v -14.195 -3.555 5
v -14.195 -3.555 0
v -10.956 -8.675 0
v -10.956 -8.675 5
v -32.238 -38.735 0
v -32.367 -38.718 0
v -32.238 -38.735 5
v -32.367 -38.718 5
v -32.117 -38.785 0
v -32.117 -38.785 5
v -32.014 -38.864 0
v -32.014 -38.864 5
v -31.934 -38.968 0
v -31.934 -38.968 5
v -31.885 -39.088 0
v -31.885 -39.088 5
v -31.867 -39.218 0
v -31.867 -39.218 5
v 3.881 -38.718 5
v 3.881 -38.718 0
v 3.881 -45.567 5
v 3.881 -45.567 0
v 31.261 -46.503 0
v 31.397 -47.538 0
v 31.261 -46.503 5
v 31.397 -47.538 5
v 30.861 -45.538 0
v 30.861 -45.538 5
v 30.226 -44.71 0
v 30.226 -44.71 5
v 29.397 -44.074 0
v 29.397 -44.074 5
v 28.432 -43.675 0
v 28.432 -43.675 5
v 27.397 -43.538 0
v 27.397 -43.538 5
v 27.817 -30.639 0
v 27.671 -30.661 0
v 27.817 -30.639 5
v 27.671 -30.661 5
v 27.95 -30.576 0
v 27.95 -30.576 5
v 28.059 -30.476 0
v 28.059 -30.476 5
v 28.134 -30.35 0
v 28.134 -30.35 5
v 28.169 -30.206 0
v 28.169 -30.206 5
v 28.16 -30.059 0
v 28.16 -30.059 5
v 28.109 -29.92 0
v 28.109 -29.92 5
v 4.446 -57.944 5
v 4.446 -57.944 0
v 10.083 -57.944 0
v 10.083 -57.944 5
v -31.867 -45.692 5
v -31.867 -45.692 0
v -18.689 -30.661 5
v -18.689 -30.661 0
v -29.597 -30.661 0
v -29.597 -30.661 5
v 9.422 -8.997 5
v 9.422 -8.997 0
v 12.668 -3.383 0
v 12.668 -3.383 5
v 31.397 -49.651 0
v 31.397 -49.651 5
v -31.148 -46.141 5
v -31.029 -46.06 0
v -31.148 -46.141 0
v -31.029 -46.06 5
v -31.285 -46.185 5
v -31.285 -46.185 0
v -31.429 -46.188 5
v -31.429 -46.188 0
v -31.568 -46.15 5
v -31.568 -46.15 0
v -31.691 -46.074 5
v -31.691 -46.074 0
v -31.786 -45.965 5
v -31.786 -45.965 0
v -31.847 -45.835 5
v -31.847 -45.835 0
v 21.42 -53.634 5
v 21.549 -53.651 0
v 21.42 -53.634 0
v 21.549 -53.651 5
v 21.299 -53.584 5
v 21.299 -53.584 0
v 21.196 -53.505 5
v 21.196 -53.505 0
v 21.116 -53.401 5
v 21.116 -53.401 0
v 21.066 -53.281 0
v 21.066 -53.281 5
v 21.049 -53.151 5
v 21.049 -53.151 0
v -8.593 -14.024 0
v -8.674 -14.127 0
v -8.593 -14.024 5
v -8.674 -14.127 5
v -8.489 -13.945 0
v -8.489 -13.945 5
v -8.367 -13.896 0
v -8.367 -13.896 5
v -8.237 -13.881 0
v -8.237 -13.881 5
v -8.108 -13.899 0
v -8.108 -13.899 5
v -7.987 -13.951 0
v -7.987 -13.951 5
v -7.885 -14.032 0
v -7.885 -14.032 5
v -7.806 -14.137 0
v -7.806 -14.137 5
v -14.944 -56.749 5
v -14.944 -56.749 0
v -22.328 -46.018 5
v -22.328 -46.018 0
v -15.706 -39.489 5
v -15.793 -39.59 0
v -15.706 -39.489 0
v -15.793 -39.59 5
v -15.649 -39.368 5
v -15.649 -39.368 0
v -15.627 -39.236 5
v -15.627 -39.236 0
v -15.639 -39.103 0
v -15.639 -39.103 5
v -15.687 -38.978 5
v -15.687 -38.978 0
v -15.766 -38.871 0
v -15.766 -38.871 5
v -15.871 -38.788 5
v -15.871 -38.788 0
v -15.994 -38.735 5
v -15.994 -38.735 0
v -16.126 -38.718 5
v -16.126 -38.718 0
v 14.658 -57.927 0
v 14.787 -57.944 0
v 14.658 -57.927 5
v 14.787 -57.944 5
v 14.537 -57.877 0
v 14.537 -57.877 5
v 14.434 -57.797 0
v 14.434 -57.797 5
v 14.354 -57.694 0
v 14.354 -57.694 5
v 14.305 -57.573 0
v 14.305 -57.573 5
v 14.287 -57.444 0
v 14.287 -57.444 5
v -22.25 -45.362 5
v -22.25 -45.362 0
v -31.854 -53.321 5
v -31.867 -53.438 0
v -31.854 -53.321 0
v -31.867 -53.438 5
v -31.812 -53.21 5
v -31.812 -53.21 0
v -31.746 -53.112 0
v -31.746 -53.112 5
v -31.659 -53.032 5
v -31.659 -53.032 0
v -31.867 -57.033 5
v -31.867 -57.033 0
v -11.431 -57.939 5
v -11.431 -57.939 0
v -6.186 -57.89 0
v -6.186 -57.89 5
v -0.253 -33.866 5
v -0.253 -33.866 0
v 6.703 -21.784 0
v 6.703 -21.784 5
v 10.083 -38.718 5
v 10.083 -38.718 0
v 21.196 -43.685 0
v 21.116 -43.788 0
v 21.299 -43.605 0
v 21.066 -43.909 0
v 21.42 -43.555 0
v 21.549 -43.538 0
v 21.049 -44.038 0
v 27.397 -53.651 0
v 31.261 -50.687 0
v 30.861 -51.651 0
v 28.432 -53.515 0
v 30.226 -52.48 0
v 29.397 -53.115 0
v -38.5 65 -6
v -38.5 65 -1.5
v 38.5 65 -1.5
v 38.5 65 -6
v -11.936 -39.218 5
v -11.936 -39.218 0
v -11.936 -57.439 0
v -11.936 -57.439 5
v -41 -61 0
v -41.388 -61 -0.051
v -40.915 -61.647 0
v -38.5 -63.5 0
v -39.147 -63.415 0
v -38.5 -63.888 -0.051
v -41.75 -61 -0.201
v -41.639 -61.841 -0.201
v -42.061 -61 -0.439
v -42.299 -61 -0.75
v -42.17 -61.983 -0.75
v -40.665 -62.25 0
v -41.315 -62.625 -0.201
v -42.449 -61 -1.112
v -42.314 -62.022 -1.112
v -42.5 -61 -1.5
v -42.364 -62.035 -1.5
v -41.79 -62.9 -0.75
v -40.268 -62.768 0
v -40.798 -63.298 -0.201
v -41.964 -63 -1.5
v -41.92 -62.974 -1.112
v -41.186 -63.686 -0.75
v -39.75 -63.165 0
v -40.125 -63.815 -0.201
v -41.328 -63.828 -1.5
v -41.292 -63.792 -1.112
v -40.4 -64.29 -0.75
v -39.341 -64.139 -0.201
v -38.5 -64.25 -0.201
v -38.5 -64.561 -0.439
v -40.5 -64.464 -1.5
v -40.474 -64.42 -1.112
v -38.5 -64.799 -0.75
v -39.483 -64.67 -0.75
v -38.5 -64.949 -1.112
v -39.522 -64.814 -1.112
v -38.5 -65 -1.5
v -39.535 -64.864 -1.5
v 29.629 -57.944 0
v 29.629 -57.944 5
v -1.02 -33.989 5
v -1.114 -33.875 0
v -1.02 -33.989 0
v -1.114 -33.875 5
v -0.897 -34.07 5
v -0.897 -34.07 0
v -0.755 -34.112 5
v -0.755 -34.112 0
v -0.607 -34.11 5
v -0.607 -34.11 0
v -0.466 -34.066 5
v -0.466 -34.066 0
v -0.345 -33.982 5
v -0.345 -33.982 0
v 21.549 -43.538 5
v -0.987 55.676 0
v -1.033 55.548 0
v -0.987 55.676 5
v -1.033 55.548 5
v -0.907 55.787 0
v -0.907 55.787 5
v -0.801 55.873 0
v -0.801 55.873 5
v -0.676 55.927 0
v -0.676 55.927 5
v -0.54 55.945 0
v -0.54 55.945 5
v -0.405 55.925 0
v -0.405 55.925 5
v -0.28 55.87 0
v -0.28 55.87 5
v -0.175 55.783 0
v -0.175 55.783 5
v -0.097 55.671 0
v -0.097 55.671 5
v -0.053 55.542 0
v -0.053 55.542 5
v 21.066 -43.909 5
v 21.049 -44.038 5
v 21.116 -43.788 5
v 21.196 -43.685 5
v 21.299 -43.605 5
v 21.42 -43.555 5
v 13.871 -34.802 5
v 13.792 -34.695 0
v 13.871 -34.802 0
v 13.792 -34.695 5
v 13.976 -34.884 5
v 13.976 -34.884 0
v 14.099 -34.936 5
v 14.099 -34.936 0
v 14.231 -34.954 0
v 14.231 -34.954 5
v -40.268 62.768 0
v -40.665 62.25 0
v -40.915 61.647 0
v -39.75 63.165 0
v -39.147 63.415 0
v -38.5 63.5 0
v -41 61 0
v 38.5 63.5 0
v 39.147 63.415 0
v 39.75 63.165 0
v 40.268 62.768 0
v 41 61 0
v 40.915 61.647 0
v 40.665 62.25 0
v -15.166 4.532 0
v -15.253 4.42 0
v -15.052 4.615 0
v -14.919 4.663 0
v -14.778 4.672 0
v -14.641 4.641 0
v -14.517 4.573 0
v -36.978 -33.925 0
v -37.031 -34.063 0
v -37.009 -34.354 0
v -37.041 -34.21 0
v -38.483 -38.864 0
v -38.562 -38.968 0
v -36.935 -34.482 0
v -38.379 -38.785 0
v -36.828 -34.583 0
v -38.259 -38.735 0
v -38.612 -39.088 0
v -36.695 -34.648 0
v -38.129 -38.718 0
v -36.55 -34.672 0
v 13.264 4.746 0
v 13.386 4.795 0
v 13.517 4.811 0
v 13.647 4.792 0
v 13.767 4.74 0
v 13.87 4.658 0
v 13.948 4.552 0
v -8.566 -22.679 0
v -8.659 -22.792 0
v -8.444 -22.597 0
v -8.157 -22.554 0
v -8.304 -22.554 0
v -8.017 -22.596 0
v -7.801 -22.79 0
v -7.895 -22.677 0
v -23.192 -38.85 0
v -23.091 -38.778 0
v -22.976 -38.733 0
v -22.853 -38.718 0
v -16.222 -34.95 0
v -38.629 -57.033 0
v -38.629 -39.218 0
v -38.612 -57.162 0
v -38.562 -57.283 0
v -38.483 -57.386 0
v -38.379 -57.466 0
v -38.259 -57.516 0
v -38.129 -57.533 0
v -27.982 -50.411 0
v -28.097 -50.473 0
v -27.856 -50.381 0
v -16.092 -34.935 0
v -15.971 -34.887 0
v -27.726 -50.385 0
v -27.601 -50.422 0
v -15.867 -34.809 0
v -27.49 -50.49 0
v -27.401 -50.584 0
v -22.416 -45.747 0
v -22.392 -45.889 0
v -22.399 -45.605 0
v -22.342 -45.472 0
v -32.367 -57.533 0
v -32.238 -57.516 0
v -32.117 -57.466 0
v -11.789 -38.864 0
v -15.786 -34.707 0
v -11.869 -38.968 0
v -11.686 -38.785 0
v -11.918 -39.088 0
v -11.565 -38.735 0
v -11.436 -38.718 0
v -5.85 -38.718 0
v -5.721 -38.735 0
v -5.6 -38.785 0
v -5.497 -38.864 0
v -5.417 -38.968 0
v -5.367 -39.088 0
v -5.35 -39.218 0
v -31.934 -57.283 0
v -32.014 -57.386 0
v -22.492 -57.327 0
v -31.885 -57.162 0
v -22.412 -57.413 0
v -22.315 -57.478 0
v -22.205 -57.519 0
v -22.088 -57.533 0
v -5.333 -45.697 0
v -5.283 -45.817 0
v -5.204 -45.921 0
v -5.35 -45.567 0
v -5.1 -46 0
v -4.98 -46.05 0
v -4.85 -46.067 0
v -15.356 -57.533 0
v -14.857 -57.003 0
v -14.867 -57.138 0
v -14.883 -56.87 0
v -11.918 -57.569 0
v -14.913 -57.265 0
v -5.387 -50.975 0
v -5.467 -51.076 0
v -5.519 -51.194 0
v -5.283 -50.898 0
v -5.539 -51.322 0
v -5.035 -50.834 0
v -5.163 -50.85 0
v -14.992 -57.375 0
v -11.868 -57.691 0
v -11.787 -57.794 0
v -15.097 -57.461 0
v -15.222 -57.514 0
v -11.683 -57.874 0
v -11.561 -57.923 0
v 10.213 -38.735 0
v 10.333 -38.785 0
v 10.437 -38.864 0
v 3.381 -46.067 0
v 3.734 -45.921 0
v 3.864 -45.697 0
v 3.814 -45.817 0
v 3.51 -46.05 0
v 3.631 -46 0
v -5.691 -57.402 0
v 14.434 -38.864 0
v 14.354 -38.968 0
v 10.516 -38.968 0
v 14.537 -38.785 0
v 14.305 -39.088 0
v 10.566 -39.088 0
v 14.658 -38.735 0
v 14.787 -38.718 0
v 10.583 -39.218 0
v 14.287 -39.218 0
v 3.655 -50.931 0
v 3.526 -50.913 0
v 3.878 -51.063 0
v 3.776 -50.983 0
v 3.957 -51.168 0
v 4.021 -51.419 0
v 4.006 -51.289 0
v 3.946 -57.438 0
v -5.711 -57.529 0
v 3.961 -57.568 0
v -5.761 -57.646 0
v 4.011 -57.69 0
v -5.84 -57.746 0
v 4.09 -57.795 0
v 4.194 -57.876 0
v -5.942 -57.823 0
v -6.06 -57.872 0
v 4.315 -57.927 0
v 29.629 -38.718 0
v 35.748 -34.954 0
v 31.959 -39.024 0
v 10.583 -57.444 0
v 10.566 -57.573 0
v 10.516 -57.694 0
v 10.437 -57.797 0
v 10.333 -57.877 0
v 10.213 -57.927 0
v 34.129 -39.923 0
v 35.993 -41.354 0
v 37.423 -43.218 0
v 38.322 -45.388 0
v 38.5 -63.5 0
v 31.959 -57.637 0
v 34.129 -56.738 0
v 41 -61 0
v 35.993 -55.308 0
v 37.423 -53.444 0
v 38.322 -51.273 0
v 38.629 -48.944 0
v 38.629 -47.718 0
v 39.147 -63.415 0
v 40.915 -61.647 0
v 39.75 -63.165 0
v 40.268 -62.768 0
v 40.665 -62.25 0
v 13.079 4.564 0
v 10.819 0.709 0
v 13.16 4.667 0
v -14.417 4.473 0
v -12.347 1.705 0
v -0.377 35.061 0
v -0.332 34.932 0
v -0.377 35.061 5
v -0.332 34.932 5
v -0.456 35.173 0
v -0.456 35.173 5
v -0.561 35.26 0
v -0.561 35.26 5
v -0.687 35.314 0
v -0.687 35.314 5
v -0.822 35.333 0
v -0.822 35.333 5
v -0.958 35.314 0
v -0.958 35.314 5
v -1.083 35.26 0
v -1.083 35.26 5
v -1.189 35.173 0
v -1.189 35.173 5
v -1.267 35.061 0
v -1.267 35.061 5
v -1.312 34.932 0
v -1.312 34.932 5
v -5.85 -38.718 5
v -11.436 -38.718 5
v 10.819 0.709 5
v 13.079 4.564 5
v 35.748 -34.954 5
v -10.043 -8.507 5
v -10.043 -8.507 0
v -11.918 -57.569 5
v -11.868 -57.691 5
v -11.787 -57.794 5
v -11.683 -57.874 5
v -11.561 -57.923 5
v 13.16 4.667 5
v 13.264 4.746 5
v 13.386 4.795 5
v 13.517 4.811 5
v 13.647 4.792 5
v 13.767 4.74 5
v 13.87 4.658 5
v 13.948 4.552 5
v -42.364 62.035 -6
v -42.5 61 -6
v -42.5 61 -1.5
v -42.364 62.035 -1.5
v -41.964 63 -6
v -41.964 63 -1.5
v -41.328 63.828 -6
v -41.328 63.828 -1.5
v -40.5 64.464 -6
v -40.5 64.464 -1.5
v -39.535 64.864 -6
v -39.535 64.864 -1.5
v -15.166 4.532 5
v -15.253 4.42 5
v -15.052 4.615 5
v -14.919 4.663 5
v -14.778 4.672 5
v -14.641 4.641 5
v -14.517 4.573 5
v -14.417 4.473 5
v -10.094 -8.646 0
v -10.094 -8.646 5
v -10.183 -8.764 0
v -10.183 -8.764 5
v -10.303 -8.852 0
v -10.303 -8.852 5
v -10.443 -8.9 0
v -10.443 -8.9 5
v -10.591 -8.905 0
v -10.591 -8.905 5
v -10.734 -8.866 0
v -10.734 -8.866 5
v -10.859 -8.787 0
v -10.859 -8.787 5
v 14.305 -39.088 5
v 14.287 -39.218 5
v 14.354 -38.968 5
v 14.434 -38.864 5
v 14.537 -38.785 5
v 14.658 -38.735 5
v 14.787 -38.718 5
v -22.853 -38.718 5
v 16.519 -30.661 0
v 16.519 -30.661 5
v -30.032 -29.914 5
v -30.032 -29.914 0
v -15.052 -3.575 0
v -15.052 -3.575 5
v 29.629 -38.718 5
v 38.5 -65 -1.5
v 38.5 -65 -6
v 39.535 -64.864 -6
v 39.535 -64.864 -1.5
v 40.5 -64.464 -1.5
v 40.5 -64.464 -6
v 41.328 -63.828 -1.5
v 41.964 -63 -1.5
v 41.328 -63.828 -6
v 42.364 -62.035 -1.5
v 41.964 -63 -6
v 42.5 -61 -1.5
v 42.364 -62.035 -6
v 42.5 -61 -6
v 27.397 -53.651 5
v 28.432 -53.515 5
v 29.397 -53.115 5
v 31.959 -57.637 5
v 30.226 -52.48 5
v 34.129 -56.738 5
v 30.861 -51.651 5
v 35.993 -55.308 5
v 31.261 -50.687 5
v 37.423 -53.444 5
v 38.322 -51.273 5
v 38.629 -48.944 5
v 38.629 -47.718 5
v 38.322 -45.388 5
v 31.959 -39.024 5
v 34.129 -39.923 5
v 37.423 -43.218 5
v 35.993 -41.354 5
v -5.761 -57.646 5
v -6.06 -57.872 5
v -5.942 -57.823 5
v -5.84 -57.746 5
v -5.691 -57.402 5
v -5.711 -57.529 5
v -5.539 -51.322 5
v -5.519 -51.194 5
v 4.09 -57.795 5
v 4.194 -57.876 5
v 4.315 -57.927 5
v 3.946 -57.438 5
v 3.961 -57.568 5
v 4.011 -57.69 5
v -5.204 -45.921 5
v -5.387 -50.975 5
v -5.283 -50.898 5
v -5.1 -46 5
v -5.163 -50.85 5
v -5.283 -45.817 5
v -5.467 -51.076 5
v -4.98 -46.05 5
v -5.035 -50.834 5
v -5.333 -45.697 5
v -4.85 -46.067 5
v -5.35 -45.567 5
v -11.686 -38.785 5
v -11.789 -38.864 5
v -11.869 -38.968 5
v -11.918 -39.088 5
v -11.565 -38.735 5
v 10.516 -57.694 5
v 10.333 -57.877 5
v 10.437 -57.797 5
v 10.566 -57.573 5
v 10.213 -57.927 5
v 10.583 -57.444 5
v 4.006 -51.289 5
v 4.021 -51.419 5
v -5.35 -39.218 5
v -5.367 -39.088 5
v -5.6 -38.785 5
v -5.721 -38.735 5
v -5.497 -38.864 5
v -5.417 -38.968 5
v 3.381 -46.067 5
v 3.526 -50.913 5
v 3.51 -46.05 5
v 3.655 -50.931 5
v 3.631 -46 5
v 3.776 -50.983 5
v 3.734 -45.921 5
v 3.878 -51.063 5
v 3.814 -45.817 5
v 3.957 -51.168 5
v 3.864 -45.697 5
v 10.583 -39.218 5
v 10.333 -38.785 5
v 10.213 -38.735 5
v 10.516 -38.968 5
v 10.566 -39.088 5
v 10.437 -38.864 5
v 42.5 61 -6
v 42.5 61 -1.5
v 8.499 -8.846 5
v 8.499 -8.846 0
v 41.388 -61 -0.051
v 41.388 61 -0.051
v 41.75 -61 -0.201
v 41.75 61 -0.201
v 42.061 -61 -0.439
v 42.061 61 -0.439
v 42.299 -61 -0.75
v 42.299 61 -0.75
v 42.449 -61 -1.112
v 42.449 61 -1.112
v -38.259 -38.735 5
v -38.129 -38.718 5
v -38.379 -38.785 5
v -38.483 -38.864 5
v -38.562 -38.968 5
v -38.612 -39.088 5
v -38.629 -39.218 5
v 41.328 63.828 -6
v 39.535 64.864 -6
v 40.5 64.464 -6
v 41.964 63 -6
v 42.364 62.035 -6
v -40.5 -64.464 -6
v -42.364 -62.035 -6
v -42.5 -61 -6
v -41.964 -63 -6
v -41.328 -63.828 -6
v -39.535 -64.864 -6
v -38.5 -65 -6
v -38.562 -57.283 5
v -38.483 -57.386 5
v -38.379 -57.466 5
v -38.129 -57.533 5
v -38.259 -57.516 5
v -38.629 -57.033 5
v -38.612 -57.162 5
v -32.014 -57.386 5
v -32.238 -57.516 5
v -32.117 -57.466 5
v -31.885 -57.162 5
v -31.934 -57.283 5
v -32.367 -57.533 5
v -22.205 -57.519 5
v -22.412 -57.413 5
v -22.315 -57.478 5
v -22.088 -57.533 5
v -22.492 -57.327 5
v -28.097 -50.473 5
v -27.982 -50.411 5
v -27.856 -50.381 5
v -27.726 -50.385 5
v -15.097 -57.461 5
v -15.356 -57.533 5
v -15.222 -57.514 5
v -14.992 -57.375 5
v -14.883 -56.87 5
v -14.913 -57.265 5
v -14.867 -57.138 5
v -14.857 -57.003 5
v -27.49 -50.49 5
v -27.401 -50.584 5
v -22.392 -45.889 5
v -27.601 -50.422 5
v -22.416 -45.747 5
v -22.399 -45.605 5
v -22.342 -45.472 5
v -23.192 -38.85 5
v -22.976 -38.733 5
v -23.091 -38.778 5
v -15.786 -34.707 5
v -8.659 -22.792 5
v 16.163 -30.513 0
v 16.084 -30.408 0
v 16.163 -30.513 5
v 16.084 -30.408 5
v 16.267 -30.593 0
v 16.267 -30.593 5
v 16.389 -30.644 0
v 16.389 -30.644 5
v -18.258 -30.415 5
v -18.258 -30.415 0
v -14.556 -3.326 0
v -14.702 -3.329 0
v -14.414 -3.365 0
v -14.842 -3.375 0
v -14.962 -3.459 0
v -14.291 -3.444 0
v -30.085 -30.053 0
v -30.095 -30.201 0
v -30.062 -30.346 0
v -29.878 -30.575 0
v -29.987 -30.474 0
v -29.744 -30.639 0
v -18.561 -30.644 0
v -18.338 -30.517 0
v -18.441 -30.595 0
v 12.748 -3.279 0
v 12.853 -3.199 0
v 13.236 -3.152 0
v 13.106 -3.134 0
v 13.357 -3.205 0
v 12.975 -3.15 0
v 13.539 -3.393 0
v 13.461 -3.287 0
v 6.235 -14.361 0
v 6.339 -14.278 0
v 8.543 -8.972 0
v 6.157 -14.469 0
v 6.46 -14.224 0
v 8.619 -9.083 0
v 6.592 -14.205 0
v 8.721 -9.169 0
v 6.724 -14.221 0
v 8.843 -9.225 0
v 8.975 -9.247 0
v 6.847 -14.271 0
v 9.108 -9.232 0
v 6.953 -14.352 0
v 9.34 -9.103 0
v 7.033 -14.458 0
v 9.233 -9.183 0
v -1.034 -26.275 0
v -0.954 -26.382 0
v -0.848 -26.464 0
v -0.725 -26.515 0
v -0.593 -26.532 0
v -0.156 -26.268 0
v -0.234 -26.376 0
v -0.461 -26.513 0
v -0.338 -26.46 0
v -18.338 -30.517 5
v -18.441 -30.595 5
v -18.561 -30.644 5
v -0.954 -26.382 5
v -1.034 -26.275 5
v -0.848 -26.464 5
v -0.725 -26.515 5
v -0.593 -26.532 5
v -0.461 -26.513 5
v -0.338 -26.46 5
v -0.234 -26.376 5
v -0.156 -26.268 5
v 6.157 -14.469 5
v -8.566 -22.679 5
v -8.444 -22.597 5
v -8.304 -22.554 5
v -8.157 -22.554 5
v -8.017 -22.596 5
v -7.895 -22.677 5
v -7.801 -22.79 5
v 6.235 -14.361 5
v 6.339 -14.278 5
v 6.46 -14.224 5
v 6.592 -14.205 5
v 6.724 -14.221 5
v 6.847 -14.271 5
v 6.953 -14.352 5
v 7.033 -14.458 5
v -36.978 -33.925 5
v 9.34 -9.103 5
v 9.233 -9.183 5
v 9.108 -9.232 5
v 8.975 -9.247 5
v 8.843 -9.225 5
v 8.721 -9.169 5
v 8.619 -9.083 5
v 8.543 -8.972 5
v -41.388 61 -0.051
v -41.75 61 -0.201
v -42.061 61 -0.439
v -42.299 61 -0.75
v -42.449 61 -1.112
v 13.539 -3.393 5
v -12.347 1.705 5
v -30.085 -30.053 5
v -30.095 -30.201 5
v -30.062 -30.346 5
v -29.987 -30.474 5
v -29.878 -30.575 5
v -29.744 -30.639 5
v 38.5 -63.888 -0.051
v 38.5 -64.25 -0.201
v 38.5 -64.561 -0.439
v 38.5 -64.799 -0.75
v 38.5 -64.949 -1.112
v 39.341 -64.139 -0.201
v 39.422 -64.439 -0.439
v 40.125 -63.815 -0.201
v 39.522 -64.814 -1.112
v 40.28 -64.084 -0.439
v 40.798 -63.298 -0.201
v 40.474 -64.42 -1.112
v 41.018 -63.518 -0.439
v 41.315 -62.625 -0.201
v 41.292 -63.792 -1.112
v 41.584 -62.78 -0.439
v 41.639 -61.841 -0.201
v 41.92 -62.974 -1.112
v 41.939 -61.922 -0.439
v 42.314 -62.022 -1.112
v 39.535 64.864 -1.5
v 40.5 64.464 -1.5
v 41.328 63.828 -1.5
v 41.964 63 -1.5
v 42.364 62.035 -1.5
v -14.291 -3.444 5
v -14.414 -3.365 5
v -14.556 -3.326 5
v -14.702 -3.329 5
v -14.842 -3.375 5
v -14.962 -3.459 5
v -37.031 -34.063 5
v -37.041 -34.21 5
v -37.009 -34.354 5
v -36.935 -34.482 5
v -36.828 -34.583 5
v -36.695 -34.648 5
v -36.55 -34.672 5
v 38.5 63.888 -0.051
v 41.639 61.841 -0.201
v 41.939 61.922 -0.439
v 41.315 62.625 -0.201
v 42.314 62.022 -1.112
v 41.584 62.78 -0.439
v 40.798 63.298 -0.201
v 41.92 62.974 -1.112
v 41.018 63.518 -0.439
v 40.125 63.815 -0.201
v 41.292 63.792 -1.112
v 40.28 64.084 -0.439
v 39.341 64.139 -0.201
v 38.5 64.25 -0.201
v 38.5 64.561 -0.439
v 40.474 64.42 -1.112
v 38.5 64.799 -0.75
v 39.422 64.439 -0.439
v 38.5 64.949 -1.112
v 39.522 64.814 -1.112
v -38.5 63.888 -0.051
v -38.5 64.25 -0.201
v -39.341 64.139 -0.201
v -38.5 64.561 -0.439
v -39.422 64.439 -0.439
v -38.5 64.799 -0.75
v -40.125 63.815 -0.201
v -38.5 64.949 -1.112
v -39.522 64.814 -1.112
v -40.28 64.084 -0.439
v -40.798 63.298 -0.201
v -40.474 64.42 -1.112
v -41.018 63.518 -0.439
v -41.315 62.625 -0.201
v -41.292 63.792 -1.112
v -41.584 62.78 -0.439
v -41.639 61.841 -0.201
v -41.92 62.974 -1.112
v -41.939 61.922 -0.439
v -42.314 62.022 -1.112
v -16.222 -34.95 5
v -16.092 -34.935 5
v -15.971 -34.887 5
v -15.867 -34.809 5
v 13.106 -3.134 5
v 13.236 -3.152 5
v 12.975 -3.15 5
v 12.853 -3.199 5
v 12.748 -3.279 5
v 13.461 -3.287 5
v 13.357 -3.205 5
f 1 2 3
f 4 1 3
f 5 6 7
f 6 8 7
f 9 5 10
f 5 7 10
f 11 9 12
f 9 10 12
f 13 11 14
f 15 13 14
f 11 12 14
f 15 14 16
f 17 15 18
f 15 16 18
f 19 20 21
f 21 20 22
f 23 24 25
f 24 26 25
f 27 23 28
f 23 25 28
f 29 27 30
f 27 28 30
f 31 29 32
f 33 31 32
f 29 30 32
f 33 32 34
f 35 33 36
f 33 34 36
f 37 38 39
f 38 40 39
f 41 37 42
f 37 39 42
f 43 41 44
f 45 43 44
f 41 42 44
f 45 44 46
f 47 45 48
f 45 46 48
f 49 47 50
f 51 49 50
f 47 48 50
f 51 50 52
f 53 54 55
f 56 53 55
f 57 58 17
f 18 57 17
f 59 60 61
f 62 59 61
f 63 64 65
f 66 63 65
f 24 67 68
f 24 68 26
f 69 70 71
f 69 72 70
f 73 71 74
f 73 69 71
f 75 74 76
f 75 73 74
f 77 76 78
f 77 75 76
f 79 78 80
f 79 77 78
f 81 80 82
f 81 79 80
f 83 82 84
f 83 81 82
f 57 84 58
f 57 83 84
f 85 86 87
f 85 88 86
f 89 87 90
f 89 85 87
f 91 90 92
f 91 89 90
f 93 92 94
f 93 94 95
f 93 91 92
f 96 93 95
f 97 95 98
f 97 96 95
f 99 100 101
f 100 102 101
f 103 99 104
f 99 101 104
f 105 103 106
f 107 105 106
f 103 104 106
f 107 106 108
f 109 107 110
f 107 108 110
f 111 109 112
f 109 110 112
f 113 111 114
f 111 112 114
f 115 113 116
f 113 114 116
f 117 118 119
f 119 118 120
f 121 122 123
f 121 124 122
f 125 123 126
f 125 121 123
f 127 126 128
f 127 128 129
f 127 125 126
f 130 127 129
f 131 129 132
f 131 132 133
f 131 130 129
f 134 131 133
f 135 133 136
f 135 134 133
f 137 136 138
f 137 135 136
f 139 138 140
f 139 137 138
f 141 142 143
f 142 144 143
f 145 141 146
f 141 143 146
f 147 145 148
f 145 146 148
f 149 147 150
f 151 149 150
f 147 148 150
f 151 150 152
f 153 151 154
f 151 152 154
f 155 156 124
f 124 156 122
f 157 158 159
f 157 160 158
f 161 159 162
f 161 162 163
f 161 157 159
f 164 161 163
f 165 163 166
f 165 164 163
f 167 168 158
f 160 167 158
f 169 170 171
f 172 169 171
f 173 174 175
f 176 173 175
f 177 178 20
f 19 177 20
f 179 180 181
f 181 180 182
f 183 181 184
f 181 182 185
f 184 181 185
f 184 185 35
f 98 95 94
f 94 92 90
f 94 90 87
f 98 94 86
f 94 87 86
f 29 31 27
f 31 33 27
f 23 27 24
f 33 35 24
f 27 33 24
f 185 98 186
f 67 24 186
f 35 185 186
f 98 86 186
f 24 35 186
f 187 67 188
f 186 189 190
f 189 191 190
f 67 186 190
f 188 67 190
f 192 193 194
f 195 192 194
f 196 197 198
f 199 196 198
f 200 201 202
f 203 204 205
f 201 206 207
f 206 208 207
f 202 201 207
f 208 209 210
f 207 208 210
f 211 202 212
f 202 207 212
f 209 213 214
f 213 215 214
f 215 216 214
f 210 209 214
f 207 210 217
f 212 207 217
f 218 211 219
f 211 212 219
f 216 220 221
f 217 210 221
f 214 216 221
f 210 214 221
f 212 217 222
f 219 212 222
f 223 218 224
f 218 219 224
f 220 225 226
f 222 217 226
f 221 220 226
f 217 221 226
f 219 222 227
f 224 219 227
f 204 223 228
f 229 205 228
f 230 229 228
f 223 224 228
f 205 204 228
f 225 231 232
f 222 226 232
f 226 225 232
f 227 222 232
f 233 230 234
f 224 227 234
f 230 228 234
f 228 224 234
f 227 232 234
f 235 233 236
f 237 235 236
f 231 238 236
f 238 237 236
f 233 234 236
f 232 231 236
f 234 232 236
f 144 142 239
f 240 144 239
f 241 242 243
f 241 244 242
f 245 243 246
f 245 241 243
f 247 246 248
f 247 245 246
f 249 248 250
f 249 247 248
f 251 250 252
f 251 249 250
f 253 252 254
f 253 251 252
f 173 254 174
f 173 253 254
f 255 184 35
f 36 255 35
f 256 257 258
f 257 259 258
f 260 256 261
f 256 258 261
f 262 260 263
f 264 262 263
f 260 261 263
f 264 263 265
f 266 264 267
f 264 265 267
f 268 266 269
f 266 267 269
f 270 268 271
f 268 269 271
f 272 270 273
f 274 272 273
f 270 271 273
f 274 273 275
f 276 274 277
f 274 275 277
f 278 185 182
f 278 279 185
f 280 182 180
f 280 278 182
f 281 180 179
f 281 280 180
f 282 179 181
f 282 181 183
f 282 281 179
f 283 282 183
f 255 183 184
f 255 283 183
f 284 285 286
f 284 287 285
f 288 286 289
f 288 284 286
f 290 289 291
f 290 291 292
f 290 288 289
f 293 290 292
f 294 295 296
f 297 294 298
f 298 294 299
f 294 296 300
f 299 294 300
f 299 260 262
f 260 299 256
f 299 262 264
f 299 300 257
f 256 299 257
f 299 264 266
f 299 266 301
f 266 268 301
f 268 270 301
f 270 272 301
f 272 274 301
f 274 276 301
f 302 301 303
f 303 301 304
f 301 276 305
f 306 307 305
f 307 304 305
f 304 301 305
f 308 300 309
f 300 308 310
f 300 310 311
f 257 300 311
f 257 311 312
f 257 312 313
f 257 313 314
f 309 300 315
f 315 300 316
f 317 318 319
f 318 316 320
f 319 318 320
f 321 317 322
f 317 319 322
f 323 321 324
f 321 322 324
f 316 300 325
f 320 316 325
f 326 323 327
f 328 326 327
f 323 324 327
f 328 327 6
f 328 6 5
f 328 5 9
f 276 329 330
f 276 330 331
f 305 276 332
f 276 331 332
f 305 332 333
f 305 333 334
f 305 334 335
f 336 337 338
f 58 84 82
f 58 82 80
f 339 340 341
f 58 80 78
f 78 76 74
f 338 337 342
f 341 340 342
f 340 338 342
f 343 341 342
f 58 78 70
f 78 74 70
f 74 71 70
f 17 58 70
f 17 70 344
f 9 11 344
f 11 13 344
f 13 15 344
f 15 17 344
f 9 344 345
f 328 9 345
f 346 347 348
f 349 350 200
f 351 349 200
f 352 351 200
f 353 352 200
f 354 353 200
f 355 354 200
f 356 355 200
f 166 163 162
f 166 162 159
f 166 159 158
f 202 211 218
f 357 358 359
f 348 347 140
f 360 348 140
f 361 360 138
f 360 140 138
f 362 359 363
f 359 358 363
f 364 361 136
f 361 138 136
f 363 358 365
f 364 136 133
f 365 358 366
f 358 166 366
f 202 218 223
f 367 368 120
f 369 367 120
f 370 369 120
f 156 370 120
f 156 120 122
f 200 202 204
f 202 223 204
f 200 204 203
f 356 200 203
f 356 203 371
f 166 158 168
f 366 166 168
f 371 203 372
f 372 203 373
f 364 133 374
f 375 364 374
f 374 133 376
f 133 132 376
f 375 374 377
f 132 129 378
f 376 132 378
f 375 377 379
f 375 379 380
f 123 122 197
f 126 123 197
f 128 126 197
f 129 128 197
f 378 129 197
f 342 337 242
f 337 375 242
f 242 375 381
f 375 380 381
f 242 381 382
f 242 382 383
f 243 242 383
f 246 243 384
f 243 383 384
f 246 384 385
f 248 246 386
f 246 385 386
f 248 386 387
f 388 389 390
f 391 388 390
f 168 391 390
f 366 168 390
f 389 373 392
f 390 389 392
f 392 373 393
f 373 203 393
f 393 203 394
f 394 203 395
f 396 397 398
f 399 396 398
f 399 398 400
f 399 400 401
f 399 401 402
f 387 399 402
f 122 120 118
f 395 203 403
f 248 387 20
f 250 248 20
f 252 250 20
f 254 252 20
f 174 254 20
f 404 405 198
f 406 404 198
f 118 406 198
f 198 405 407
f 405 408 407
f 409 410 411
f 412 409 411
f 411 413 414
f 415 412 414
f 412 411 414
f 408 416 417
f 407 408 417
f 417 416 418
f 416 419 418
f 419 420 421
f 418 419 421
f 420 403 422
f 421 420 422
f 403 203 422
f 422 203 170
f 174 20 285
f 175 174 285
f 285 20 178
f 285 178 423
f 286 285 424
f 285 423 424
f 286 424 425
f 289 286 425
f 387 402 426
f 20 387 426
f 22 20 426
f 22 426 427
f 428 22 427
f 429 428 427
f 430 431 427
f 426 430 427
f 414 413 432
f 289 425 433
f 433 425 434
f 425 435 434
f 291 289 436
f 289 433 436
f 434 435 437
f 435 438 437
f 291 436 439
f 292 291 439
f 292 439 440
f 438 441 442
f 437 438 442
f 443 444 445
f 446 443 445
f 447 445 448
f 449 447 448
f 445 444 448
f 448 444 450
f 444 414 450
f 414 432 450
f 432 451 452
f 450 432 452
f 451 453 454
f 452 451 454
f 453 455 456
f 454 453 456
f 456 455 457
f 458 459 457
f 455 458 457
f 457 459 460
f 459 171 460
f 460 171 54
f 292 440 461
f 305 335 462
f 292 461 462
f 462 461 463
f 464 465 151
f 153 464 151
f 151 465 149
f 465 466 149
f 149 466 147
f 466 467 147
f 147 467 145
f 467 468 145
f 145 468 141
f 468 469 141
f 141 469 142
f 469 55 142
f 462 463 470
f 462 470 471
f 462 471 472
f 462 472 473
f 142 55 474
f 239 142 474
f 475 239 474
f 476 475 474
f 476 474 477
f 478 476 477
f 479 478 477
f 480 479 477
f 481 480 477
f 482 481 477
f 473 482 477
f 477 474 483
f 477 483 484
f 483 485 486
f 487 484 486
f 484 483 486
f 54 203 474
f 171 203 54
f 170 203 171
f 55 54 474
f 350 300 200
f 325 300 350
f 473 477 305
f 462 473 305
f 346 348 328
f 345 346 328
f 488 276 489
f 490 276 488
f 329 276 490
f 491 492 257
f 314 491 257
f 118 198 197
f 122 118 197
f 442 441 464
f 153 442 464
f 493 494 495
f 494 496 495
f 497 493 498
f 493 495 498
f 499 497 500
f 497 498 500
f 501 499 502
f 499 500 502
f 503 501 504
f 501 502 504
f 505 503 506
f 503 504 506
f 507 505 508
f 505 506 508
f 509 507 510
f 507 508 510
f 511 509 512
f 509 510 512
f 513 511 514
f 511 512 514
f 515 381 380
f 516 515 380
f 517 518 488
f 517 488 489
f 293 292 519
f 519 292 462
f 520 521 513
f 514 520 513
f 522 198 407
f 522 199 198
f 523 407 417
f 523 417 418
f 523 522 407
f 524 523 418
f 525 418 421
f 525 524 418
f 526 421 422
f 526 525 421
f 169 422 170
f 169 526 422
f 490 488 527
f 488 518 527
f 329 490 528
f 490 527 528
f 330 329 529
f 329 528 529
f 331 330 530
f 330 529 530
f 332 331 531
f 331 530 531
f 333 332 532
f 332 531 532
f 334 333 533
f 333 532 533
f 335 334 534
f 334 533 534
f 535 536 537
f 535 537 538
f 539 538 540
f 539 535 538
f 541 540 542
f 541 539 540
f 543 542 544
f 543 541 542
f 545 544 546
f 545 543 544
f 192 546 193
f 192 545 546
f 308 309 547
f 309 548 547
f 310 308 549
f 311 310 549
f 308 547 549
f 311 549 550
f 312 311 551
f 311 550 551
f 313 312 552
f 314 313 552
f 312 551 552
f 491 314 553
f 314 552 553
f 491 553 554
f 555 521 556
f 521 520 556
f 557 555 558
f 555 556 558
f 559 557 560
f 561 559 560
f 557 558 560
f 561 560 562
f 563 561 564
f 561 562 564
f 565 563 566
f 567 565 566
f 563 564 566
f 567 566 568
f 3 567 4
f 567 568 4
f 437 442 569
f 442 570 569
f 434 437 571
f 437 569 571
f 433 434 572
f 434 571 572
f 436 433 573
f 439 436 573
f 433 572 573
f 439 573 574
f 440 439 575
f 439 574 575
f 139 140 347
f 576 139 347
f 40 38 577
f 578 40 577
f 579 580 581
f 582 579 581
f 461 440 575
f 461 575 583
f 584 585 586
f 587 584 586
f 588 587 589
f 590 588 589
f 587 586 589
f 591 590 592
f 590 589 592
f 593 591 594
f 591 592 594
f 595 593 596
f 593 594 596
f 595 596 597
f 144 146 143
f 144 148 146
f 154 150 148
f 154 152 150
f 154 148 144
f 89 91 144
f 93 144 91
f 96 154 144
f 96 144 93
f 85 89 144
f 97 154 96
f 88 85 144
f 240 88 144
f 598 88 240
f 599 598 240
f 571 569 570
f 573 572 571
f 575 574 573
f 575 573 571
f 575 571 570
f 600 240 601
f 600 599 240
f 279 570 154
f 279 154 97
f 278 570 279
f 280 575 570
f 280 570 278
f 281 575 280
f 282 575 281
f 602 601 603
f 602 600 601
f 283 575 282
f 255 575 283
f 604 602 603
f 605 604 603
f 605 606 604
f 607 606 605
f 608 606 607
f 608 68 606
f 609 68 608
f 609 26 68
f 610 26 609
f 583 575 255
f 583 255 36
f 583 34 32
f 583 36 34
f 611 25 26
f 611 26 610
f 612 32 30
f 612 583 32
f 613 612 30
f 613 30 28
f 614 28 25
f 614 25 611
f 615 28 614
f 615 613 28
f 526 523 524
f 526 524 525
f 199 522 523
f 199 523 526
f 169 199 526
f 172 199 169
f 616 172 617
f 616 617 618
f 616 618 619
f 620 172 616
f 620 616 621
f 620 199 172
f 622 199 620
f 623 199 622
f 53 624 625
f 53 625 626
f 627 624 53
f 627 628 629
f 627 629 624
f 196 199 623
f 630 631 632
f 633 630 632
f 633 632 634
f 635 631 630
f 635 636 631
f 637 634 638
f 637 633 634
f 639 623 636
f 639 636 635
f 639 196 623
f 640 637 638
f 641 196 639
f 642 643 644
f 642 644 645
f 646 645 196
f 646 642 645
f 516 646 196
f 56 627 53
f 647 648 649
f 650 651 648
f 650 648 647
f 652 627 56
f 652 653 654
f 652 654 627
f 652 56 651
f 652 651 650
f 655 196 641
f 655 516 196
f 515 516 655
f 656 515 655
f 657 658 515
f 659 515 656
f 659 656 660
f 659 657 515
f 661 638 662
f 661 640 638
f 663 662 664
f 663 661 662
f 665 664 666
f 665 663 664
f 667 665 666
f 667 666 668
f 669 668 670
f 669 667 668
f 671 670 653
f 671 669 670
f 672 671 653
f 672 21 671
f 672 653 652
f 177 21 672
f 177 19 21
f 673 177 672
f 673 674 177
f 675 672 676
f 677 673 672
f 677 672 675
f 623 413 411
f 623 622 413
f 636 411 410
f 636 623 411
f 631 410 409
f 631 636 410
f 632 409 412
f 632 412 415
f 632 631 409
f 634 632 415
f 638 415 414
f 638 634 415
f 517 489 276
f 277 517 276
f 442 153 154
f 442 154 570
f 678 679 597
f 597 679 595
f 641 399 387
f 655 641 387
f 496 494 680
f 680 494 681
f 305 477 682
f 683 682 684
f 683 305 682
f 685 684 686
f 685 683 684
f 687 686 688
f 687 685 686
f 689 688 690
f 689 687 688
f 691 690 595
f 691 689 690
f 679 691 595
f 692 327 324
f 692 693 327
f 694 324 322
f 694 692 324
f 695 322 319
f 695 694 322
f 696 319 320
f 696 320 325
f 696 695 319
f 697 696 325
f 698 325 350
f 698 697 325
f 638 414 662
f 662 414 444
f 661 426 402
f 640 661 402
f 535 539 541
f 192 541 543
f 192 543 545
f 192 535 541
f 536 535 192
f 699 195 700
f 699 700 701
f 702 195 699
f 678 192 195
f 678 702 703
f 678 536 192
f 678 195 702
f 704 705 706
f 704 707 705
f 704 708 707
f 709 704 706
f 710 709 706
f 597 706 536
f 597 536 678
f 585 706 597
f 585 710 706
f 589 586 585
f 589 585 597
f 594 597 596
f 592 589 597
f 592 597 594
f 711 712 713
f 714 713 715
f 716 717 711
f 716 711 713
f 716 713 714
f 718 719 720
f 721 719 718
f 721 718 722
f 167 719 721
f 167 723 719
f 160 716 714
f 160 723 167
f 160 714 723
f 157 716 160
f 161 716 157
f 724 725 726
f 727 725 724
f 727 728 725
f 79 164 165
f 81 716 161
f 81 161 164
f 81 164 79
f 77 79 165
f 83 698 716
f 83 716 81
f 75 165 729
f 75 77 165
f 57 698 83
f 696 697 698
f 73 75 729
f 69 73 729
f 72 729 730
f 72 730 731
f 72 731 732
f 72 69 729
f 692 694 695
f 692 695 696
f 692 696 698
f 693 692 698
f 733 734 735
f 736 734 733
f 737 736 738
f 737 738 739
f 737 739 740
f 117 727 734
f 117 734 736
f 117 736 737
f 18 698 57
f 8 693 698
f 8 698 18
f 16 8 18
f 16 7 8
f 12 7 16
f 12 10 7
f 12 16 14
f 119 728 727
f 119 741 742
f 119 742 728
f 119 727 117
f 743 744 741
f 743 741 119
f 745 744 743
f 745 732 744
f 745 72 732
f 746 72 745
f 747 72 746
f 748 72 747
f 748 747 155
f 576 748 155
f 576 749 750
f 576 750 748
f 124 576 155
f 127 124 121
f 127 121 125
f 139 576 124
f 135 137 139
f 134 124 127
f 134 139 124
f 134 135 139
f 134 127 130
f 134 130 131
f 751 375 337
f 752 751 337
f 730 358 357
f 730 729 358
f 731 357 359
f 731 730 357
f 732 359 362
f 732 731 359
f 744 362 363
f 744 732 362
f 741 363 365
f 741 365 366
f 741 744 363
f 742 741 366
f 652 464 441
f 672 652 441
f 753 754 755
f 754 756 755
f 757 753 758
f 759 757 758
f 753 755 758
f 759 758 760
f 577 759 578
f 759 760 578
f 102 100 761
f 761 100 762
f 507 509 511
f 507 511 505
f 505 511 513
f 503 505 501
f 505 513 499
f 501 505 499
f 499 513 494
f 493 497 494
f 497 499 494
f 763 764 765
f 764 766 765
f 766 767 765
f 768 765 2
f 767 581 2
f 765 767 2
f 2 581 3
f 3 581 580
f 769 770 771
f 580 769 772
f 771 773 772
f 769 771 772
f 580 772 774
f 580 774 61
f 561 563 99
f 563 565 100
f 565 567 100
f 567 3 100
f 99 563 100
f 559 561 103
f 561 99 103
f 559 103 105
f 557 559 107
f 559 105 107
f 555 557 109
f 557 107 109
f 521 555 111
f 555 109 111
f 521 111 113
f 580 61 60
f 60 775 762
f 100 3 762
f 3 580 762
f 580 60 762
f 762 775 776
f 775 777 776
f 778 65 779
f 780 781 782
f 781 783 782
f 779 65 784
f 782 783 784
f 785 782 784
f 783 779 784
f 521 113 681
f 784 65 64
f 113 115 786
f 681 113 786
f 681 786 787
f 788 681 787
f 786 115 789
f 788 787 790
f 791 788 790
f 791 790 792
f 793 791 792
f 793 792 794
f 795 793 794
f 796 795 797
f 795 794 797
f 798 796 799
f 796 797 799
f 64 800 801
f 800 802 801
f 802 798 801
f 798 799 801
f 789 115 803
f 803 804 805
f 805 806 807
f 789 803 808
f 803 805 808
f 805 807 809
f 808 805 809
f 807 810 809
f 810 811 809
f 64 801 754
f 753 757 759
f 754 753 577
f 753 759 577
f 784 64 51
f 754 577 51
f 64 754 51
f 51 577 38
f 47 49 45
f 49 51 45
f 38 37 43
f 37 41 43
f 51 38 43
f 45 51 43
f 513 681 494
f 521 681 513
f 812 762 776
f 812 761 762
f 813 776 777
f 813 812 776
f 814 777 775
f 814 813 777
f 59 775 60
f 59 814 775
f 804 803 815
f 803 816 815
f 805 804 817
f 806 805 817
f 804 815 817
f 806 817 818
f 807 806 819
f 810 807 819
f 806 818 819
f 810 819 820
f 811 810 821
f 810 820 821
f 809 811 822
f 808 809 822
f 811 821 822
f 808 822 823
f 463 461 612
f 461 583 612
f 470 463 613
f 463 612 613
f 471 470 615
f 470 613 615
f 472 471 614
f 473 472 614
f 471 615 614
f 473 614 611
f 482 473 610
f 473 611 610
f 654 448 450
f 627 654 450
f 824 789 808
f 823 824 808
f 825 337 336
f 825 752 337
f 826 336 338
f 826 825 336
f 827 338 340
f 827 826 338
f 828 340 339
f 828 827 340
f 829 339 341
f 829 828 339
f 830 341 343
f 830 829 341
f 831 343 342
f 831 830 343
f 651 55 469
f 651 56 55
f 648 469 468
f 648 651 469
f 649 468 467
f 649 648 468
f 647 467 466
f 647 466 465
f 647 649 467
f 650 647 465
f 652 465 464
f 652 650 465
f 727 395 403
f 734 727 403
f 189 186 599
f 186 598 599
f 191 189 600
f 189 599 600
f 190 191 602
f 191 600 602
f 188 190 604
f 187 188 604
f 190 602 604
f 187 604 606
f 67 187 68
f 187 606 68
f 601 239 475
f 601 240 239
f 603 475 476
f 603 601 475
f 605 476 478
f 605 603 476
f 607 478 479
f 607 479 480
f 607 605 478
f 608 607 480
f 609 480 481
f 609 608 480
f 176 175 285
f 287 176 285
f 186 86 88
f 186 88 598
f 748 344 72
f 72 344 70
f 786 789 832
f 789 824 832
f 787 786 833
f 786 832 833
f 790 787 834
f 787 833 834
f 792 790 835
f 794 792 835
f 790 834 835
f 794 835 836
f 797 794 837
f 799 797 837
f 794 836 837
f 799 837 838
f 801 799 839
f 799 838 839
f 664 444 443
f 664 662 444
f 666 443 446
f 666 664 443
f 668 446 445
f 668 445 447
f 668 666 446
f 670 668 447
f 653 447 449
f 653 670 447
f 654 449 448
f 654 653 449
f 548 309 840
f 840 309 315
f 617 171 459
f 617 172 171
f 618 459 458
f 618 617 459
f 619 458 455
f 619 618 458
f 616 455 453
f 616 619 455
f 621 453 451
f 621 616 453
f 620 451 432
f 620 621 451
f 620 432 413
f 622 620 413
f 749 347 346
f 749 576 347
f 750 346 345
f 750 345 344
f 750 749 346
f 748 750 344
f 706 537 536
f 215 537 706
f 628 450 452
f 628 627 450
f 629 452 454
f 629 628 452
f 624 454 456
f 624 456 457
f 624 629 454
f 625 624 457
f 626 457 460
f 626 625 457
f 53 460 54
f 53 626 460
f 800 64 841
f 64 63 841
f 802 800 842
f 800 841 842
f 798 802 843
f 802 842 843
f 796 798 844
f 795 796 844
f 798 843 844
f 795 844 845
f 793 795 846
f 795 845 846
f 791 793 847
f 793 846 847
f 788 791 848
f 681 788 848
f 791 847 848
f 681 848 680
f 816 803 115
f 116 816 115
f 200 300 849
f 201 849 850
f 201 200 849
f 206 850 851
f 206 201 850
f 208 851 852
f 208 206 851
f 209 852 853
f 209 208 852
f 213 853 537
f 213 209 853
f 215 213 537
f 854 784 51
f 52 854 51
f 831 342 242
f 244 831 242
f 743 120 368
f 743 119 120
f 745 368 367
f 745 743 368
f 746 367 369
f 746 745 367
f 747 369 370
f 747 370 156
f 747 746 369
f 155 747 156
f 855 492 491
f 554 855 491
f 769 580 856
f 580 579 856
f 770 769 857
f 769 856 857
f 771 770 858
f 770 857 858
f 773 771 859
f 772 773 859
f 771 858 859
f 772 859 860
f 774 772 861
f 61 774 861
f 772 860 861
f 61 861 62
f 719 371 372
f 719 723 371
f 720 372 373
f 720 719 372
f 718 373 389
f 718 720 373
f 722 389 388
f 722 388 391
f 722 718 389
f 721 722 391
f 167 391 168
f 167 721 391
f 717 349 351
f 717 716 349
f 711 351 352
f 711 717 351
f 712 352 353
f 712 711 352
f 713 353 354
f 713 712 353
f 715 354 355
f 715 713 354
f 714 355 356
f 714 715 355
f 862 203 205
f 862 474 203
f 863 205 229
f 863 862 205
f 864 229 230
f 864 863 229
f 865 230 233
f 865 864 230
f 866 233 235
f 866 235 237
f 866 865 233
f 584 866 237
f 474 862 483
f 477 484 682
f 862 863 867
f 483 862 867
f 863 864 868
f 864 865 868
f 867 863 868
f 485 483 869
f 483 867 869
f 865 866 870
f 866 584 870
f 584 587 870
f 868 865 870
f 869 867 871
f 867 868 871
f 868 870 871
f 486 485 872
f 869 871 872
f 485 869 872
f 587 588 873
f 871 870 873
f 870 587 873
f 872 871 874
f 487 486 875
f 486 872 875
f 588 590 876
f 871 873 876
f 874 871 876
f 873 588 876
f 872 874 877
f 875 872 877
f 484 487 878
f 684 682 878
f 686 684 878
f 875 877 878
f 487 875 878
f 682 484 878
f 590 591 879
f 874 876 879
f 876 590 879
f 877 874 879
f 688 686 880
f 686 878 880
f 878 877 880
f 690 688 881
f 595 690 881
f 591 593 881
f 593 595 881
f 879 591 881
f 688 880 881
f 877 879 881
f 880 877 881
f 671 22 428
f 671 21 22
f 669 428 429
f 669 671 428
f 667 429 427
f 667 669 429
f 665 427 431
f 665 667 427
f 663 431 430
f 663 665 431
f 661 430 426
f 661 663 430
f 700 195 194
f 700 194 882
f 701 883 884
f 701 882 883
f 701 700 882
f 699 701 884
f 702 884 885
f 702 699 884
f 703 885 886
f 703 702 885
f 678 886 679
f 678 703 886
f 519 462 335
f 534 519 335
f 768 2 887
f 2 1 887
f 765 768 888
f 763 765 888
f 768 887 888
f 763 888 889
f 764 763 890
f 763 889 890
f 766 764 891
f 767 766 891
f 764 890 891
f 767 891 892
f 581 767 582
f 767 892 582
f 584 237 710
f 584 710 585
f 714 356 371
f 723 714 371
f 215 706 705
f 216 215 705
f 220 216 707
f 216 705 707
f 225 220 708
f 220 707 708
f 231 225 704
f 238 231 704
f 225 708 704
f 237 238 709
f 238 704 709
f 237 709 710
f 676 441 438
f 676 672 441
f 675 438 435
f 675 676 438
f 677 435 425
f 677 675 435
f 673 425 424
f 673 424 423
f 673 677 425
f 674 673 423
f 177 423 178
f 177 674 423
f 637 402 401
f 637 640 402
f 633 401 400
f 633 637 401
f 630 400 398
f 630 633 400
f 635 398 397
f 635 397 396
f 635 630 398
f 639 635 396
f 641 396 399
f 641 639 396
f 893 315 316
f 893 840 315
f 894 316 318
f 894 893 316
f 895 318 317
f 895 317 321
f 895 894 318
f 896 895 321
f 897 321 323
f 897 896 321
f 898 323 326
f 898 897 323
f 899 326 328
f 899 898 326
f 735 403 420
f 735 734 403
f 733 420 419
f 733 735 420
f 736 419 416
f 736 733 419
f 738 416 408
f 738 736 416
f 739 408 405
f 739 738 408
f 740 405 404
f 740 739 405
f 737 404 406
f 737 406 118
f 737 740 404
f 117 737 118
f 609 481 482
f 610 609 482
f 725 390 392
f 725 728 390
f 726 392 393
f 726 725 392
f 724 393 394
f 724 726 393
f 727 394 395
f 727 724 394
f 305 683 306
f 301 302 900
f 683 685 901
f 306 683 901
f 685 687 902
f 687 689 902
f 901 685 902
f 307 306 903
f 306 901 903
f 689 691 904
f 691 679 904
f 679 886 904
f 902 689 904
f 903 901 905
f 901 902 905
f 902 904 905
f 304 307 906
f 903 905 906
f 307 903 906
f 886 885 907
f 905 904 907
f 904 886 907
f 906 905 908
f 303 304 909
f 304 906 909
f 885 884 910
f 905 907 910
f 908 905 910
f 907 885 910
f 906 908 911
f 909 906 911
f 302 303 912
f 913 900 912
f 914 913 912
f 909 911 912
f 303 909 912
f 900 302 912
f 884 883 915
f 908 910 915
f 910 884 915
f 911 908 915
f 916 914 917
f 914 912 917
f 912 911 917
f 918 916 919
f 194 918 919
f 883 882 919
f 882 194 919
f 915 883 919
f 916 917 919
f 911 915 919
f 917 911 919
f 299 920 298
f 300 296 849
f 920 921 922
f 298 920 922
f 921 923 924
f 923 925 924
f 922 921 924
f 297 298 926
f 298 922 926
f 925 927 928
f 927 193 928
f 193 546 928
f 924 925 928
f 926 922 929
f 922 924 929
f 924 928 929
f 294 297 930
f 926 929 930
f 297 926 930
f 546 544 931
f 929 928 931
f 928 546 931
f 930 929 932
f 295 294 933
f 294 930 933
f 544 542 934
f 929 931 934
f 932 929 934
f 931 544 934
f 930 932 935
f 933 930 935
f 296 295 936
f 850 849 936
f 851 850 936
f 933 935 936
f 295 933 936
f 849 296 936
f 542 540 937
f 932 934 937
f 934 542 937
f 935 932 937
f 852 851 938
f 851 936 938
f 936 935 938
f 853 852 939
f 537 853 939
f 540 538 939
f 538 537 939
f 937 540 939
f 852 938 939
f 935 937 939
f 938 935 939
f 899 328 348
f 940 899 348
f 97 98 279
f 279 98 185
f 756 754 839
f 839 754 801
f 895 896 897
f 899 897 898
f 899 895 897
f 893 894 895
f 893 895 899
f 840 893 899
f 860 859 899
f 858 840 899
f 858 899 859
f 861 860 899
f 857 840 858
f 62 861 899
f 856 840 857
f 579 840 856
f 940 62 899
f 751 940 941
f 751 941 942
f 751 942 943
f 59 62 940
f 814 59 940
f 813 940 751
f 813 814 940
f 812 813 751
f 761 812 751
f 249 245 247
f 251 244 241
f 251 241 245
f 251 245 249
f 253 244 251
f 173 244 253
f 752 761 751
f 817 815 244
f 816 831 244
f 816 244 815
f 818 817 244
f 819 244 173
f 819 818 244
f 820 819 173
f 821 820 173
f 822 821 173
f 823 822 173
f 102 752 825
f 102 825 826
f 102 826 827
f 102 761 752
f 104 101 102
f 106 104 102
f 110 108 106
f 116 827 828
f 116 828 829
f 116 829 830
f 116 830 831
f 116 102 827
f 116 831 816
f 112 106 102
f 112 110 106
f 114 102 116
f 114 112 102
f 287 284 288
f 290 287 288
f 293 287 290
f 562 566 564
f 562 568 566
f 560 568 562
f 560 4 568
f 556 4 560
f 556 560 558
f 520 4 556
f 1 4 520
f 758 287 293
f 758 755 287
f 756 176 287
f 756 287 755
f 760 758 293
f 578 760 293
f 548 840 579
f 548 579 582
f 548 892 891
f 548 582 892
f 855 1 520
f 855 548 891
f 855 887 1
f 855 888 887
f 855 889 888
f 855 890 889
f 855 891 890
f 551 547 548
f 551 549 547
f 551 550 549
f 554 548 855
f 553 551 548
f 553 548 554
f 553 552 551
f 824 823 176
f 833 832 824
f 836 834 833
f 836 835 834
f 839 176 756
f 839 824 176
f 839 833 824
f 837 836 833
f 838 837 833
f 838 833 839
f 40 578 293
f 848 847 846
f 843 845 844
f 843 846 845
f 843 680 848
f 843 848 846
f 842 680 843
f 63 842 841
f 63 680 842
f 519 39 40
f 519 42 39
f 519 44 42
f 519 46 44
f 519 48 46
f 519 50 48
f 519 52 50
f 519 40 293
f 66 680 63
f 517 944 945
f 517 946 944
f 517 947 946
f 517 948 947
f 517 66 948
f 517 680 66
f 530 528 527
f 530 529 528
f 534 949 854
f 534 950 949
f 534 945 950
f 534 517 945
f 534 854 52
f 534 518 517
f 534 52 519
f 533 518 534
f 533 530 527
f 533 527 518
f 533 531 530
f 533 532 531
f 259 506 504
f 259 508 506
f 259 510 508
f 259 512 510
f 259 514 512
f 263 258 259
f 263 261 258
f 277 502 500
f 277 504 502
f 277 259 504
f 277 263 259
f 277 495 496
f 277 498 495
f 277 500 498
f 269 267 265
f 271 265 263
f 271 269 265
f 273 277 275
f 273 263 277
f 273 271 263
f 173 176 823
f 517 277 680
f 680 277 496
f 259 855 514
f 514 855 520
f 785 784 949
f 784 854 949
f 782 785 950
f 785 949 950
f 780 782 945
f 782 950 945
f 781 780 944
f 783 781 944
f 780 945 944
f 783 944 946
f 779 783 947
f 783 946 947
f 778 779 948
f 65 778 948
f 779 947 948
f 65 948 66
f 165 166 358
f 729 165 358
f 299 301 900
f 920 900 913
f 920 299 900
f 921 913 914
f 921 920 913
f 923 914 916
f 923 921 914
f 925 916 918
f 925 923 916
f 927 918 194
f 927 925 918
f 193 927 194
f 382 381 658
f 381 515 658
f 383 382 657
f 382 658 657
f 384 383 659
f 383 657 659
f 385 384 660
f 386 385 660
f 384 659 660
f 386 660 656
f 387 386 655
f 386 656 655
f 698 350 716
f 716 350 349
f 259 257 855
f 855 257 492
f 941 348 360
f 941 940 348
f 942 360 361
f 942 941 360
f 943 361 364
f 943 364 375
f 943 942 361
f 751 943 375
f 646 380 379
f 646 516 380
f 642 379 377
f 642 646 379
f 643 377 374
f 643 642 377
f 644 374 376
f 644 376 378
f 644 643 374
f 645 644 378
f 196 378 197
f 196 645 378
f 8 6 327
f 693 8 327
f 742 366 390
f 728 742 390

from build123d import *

# Parameters (mm, degrees)
F0_W     = 24.341667
F0_H     = 19.226389
F0_W_2   = 10.348033
F0_H_2   = 10.113077
F1_DEPTH = 5
F2_R     = 4
F3_R     = 9
F4_R     = 0.5
F5_W     = 85
F5_H     = 130
F6_DEPTH = 6
F7_R     = 4
F8_R     = 1.5


with BuildPart() as f1:
    # F0 (on Top) → F1 (new body)
    with BuildSketch(Plane.XY):
        Polygon((-31.867478, -38.717533), (-38.629167, -38.717533), (-38.629167, -57.532578), (-31.867478, -57.532578), (-31.867478, -53.181422), (-27.693055, -50.182811), (-22.342478, -57.532578), (-14.404978, -57.532578), (-22.577778, -45.655611), (-14.816667, -38.717533), (-23.048033, -38.717533), (-31.867478, -46.831422), align=None)
        Polygon((-5.350405, -38.717533), (-11.935533, -38.717533), (-11.935533, -57.943922), (-5.703183, -57.885356), (-5.526794, -50.8298), (4.027317, -50.91765), (3.939467, -57.943922), (10.583333, -57.943922), (10.583333, -38.717533), (3.880556, -38.717533), (3.880556, -46.0673), (-5.350405, -46.0673), align=None)
        Polygon((-14.875405, 5.085994), (-37.394272, -34.660244), (-15.933567, -34.954111), (-8.231367, -22.077722), (-0.6761, -34.601333), (6.702778, -21.783856), (13.934722, -34.954111), (35.748378, -34.954111), (13.523378, 5.321639), (10.818633, 0.708828), (-0.528994, 57.943922), (-12.347222, 1.704805), align=None)
        Polygon((-18.403183, -30.661178), (-30.456539, -30.661178), (-14.640278, -2.850644), (-10.289294, -9.729811), (-0.823033, 37.366022), (8.760533, -10.1415), (13.111689, -2.615344), (28.516089, -30.661178), (16.227778, -30.661178), (6.5853, -13.669278), (-0.587905, -27.074489), (-8.231539, -13.375066), align=None, mode=Mode.SUBTRACT)
        with Locations((26.458333, -48.330727)):
            Rectangle(F0_W, F0_H)
        with Locations((26.223205, -48.594794)):
            Rectangle(F0_W_2, F0_H_2, mode=Mode.SUBTRACT)
    extrude(amount=F1_DEPTH)

    # F2
    f2_edges = [f1.edges().sort_by_distance(p)[0] for p in [
        (31.397222, -43.538256, 2.5),
        (31.397222, -53.651333, 2.5),
    ]]
    fillet(f2_edges, radius=F2_R)

    # F3
    f3_edges = [f1.edges().sort_by_distance(p)[0] for p in [
        (38.629167, -57.943922, 2.5),
        (38.629167, -38.717533, 2.5),
    ]]
    fillet(f3_edges, radius=F3_R)

    # F4
    f4_edges = [f1.edges().sort_by_distance(p)[0] for p in [
        (-38.629167, -38.717533, 2.5),
        (-31.867478, -38.717533, 2.5),
        (-23.048033, -38.717533, 2.5),
        (-14.816667, -38.717533, 2.5),
        (-31.867478, -46.831422, 2.5),
        (-22.577778, -45.655611, 2.5),
        (-14.404978, -57.532578, 2.5),
        (-22.342478, -57.532578, 2.5),
        (-27.693055, -50.182811, 2.5),
        (-31.867478, -53.181422, 2.5),
        (-31.867478, -57.532578, 2.5),
        (-38.629167, -57.532578, 2.5),
        (-11.935533, -57.943922, 2.5),
        (-5.703183, -57.885356, 2.5),
        (4.027317, -50.91765, 2.5),
        (3.939467, -57.943922, 2.5),
        (10.583333, -57.943922, 2.5),
        (14.2875, -57.943922, 2.5),
        (14.2875, -38.717533, 2.5),
        (13.934722, -34.954111, 2.5),
        (-0.6761, -34.601333, 2.5),
        (-37.394272, -34.660244, 2.5),
        (-15.933567, -34.954111, 2.5),
        (-8.231367, -22.077722, 2.5),
        (-5.526794, -50.8298, 2.5),
        (21.049189, -53.651333, 2.5),
        (21.049189, -43.538256, 2.5),
        (10.583333, -38.717533, 2.5),
        (-5.350405, -38.717533, 2.5),
        (-5.350405, -46.0673, 2.5),
        (-11.935533, -38.717533, 2.5),
        (3.880556, -46.0673, 2.5),
        (-0.587905, -27.074489, 2.5),
        (6.5853, -13.669278, 2.5),
        (16.227778, -30.661178, 2.5),
        (-8.231539, -13.375066, 2.5),
        (-18.403183, -30.661178, 2.5),
        (-30.456539, -30.661178, 2.5),
        (-14.875405, 5.085994, 2.5),
        (-10.289294, -9.729811, 2.5),
        (8.760533, -10.1415, 2.5),
        (28.516089, -30.661178, 2.5),
        (13.111689, -2.615344, 2.5),
        (13.523378, 5.321639, 2.5),
        (-0.823033, 37.366022, 2.5),
        (-0.528994, 57.943922, 2.5),
        (-14.640278, -2.850644, 2.5),
    ]]
    fillet(f4_edges, radius=F4_R)

    # F5 (on face) → F6 (join)
    with BuildSketch(Plane(origin=(0, 0, 0), x_dir=(1, 0, 0), z_dir=(0, 0, -1))):
        Rectangle(F5_W, F5_H)
    extrude(amount=F6_DEPTH)

    # F7
    f7_edges = [f1.edges().sort_by_distance(p)[0] for p in [
        (42.5, -65, -3),
        (42.5, 65, -3),
        (-42.5, 65, -3),
        (-42.5, -65, -3),
    ]]
    fillet(f7_edges, radius=F7_R)

    # F8
    f8_edges = [f1.edges().sort_by_distance(p)[0] for p in [
        (0, -65, 0),
    ]]
    fillet(f8_edges, radius=F8_R)


solid = f1.part
